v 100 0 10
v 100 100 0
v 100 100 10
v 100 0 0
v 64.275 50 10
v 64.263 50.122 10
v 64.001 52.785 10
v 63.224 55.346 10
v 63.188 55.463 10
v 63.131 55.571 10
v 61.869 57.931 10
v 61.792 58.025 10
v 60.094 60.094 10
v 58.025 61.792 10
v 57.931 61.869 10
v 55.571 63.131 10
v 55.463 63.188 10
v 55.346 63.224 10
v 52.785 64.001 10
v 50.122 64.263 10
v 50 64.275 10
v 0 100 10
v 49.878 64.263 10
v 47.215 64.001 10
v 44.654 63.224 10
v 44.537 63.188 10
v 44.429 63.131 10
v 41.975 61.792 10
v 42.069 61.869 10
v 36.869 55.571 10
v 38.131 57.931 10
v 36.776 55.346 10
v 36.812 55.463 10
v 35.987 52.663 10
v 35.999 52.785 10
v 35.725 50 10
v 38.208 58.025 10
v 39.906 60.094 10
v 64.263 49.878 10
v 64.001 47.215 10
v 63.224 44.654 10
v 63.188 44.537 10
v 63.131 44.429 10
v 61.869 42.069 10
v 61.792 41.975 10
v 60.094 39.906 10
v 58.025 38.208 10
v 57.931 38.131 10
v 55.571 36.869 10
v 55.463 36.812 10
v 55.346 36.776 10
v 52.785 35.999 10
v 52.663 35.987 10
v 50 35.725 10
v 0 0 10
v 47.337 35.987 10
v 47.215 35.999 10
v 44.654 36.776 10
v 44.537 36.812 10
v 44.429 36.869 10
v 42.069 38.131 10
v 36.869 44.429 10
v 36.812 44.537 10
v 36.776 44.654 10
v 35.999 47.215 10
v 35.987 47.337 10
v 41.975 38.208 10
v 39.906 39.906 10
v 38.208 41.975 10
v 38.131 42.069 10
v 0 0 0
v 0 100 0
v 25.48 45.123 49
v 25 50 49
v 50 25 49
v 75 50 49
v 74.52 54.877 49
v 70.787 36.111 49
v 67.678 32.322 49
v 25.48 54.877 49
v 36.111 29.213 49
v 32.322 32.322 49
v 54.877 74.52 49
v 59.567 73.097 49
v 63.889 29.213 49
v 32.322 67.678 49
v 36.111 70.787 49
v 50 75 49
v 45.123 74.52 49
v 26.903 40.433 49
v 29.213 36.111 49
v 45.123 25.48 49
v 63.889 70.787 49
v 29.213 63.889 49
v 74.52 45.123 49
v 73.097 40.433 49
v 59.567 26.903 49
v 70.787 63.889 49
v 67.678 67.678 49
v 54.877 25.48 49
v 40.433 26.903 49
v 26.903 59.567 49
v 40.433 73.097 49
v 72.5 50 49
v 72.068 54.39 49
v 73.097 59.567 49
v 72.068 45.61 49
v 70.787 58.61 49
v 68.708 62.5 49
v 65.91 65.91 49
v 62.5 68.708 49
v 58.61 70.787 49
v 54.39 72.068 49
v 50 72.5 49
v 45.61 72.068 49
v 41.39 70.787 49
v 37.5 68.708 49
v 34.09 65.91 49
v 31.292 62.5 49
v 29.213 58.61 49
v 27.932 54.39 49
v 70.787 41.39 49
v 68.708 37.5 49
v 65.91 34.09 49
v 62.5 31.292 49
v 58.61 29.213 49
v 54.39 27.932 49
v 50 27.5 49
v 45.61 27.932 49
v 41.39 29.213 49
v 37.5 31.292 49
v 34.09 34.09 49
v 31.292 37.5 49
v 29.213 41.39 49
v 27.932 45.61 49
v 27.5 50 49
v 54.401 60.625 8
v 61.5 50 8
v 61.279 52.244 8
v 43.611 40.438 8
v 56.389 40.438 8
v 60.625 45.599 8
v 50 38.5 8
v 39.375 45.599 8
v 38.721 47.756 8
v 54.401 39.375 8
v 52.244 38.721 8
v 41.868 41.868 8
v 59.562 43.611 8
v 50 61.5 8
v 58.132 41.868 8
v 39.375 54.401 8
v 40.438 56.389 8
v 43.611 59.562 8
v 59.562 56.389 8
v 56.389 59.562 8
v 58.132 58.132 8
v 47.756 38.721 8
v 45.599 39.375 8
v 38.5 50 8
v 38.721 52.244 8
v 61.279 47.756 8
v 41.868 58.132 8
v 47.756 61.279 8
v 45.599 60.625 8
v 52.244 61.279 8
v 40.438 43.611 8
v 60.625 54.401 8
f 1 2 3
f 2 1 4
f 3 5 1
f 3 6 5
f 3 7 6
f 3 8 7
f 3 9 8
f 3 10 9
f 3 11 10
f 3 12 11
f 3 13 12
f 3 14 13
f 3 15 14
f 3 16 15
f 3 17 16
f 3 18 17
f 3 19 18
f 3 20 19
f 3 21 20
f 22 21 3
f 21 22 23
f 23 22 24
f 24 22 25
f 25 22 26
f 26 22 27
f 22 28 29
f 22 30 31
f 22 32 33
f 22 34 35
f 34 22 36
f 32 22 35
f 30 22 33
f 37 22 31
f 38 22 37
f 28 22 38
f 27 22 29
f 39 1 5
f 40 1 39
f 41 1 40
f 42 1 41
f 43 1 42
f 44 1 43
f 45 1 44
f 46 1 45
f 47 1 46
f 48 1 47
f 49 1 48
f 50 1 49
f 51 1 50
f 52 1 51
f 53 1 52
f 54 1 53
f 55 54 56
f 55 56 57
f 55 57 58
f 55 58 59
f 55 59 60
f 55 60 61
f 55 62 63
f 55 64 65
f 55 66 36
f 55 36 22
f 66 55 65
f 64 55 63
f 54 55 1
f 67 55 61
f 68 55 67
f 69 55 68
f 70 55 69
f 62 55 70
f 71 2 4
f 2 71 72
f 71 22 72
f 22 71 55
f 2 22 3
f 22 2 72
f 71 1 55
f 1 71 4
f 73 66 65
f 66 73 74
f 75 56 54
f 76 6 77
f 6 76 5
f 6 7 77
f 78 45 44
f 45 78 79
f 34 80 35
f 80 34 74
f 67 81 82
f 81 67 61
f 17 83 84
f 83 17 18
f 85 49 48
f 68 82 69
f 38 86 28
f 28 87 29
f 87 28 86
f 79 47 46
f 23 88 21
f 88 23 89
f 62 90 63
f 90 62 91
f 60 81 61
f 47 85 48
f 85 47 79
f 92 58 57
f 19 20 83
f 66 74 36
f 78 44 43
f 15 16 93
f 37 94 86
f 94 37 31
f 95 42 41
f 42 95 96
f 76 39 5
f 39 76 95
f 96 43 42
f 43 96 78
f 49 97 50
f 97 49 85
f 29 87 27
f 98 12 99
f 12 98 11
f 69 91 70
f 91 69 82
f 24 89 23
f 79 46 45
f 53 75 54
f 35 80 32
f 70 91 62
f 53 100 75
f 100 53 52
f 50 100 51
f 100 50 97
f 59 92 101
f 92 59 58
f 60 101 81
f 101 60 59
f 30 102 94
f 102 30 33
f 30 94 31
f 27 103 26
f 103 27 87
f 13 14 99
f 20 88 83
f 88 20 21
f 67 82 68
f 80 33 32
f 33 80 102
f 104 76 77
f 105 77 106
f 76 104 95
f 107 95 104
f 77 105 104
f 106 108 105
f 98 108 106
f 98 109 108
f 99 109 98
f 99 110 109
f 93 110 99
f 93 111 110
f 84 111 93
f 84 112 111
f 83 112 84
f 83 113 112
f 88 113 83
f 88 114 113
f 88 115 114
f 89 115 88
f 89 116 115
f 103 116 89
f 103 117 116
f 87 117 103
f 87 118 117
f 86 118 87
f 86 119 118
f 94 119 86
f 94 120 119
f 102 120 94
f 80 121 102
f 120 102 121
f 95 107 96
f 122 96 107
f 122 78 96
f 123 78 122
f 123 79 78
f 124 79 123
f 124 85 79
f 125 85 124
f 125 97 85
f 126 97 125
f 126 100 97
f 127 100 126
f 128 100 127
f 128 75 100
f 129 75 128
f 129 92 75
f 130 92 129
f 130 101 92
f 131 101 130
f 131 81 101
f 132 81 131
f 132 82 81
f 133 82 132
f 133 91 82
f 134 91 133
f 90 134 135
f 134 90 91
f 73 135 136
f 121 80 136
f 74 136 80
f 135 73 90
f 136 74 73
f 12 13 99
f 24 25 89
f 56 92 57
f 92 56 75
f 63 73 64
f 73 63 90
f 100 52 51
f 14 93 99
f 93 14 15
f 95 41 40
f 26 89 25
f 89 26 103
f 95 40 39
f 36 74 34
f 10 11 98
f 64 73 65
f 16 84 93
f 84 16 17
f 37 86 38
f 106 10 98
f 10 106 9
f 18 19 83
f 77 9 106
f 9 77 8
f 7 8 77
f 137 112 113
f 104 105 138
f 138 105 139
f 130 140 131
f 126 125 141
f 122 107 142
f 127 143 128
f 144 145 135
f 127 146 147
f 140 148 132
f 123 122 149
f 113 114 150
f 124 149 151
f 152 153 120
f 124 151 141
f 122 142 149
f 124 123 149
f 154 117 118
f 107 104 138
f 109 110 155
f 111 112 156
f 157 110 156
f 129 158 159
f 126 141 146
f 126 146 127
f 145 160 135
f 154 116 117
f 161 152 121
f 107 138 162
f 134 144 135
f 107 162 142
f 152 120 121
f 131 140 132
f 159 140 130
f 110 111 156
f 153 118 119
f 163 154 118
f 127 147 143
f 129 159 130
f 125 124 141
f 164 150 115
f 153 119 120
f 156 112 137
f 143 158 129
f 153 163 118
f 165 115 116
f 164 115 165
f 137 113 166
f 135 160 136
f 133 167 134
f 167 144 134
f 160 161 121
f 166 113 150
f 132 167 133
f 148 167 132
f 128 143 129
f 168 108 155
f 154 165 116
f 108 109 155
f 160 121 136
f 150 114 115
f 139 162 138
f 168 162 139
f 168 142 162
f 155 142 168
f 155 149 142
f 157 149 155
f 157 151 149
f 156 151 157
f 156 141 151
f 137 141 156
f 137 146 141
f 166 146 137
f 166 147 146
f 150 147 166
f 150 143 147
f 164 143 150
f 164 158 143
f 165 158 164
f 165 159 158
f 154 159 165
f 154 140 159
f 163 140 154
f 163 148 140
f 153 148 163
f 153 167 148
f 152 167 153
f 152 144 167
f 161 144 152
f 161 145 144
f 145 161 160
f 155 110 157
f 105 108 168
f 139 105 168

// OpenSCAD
$fn = 32;

// ----------------------------------------------------------------------
// Hopper: funnel with square flange
// ----------------------------------------------------------------------

// --- parameters (mm) ---
fl = 100;                 // flange side, X and Y
fl_t = 10;                // flange thickness
cone_h = 40;              // cone height above the flange
top_d = 50;               // cone mouth diameter
bot_d = 28;               // cone spout diameter
wall = 2.5;               // cone wall thickness

bore_d = bot_d - 2 * wall;  // spout bore diameter
total_h = fl_t + cone_h - 1;  // overall height

difference() {
  union() {
    cube([fl, fl, fl_t]);
    translate([fl / 2, fl / 2, fl_t - 1])
      cylinder(h = cone_h, d1 = bot_d, d2 = top_d);
  }
  translate([fl / 2, fl / 2, fl_t - 2])
    cylinder(h = cone_h + 1, d1 = bore_d, d2 = top_d - 2 * wall);
}
